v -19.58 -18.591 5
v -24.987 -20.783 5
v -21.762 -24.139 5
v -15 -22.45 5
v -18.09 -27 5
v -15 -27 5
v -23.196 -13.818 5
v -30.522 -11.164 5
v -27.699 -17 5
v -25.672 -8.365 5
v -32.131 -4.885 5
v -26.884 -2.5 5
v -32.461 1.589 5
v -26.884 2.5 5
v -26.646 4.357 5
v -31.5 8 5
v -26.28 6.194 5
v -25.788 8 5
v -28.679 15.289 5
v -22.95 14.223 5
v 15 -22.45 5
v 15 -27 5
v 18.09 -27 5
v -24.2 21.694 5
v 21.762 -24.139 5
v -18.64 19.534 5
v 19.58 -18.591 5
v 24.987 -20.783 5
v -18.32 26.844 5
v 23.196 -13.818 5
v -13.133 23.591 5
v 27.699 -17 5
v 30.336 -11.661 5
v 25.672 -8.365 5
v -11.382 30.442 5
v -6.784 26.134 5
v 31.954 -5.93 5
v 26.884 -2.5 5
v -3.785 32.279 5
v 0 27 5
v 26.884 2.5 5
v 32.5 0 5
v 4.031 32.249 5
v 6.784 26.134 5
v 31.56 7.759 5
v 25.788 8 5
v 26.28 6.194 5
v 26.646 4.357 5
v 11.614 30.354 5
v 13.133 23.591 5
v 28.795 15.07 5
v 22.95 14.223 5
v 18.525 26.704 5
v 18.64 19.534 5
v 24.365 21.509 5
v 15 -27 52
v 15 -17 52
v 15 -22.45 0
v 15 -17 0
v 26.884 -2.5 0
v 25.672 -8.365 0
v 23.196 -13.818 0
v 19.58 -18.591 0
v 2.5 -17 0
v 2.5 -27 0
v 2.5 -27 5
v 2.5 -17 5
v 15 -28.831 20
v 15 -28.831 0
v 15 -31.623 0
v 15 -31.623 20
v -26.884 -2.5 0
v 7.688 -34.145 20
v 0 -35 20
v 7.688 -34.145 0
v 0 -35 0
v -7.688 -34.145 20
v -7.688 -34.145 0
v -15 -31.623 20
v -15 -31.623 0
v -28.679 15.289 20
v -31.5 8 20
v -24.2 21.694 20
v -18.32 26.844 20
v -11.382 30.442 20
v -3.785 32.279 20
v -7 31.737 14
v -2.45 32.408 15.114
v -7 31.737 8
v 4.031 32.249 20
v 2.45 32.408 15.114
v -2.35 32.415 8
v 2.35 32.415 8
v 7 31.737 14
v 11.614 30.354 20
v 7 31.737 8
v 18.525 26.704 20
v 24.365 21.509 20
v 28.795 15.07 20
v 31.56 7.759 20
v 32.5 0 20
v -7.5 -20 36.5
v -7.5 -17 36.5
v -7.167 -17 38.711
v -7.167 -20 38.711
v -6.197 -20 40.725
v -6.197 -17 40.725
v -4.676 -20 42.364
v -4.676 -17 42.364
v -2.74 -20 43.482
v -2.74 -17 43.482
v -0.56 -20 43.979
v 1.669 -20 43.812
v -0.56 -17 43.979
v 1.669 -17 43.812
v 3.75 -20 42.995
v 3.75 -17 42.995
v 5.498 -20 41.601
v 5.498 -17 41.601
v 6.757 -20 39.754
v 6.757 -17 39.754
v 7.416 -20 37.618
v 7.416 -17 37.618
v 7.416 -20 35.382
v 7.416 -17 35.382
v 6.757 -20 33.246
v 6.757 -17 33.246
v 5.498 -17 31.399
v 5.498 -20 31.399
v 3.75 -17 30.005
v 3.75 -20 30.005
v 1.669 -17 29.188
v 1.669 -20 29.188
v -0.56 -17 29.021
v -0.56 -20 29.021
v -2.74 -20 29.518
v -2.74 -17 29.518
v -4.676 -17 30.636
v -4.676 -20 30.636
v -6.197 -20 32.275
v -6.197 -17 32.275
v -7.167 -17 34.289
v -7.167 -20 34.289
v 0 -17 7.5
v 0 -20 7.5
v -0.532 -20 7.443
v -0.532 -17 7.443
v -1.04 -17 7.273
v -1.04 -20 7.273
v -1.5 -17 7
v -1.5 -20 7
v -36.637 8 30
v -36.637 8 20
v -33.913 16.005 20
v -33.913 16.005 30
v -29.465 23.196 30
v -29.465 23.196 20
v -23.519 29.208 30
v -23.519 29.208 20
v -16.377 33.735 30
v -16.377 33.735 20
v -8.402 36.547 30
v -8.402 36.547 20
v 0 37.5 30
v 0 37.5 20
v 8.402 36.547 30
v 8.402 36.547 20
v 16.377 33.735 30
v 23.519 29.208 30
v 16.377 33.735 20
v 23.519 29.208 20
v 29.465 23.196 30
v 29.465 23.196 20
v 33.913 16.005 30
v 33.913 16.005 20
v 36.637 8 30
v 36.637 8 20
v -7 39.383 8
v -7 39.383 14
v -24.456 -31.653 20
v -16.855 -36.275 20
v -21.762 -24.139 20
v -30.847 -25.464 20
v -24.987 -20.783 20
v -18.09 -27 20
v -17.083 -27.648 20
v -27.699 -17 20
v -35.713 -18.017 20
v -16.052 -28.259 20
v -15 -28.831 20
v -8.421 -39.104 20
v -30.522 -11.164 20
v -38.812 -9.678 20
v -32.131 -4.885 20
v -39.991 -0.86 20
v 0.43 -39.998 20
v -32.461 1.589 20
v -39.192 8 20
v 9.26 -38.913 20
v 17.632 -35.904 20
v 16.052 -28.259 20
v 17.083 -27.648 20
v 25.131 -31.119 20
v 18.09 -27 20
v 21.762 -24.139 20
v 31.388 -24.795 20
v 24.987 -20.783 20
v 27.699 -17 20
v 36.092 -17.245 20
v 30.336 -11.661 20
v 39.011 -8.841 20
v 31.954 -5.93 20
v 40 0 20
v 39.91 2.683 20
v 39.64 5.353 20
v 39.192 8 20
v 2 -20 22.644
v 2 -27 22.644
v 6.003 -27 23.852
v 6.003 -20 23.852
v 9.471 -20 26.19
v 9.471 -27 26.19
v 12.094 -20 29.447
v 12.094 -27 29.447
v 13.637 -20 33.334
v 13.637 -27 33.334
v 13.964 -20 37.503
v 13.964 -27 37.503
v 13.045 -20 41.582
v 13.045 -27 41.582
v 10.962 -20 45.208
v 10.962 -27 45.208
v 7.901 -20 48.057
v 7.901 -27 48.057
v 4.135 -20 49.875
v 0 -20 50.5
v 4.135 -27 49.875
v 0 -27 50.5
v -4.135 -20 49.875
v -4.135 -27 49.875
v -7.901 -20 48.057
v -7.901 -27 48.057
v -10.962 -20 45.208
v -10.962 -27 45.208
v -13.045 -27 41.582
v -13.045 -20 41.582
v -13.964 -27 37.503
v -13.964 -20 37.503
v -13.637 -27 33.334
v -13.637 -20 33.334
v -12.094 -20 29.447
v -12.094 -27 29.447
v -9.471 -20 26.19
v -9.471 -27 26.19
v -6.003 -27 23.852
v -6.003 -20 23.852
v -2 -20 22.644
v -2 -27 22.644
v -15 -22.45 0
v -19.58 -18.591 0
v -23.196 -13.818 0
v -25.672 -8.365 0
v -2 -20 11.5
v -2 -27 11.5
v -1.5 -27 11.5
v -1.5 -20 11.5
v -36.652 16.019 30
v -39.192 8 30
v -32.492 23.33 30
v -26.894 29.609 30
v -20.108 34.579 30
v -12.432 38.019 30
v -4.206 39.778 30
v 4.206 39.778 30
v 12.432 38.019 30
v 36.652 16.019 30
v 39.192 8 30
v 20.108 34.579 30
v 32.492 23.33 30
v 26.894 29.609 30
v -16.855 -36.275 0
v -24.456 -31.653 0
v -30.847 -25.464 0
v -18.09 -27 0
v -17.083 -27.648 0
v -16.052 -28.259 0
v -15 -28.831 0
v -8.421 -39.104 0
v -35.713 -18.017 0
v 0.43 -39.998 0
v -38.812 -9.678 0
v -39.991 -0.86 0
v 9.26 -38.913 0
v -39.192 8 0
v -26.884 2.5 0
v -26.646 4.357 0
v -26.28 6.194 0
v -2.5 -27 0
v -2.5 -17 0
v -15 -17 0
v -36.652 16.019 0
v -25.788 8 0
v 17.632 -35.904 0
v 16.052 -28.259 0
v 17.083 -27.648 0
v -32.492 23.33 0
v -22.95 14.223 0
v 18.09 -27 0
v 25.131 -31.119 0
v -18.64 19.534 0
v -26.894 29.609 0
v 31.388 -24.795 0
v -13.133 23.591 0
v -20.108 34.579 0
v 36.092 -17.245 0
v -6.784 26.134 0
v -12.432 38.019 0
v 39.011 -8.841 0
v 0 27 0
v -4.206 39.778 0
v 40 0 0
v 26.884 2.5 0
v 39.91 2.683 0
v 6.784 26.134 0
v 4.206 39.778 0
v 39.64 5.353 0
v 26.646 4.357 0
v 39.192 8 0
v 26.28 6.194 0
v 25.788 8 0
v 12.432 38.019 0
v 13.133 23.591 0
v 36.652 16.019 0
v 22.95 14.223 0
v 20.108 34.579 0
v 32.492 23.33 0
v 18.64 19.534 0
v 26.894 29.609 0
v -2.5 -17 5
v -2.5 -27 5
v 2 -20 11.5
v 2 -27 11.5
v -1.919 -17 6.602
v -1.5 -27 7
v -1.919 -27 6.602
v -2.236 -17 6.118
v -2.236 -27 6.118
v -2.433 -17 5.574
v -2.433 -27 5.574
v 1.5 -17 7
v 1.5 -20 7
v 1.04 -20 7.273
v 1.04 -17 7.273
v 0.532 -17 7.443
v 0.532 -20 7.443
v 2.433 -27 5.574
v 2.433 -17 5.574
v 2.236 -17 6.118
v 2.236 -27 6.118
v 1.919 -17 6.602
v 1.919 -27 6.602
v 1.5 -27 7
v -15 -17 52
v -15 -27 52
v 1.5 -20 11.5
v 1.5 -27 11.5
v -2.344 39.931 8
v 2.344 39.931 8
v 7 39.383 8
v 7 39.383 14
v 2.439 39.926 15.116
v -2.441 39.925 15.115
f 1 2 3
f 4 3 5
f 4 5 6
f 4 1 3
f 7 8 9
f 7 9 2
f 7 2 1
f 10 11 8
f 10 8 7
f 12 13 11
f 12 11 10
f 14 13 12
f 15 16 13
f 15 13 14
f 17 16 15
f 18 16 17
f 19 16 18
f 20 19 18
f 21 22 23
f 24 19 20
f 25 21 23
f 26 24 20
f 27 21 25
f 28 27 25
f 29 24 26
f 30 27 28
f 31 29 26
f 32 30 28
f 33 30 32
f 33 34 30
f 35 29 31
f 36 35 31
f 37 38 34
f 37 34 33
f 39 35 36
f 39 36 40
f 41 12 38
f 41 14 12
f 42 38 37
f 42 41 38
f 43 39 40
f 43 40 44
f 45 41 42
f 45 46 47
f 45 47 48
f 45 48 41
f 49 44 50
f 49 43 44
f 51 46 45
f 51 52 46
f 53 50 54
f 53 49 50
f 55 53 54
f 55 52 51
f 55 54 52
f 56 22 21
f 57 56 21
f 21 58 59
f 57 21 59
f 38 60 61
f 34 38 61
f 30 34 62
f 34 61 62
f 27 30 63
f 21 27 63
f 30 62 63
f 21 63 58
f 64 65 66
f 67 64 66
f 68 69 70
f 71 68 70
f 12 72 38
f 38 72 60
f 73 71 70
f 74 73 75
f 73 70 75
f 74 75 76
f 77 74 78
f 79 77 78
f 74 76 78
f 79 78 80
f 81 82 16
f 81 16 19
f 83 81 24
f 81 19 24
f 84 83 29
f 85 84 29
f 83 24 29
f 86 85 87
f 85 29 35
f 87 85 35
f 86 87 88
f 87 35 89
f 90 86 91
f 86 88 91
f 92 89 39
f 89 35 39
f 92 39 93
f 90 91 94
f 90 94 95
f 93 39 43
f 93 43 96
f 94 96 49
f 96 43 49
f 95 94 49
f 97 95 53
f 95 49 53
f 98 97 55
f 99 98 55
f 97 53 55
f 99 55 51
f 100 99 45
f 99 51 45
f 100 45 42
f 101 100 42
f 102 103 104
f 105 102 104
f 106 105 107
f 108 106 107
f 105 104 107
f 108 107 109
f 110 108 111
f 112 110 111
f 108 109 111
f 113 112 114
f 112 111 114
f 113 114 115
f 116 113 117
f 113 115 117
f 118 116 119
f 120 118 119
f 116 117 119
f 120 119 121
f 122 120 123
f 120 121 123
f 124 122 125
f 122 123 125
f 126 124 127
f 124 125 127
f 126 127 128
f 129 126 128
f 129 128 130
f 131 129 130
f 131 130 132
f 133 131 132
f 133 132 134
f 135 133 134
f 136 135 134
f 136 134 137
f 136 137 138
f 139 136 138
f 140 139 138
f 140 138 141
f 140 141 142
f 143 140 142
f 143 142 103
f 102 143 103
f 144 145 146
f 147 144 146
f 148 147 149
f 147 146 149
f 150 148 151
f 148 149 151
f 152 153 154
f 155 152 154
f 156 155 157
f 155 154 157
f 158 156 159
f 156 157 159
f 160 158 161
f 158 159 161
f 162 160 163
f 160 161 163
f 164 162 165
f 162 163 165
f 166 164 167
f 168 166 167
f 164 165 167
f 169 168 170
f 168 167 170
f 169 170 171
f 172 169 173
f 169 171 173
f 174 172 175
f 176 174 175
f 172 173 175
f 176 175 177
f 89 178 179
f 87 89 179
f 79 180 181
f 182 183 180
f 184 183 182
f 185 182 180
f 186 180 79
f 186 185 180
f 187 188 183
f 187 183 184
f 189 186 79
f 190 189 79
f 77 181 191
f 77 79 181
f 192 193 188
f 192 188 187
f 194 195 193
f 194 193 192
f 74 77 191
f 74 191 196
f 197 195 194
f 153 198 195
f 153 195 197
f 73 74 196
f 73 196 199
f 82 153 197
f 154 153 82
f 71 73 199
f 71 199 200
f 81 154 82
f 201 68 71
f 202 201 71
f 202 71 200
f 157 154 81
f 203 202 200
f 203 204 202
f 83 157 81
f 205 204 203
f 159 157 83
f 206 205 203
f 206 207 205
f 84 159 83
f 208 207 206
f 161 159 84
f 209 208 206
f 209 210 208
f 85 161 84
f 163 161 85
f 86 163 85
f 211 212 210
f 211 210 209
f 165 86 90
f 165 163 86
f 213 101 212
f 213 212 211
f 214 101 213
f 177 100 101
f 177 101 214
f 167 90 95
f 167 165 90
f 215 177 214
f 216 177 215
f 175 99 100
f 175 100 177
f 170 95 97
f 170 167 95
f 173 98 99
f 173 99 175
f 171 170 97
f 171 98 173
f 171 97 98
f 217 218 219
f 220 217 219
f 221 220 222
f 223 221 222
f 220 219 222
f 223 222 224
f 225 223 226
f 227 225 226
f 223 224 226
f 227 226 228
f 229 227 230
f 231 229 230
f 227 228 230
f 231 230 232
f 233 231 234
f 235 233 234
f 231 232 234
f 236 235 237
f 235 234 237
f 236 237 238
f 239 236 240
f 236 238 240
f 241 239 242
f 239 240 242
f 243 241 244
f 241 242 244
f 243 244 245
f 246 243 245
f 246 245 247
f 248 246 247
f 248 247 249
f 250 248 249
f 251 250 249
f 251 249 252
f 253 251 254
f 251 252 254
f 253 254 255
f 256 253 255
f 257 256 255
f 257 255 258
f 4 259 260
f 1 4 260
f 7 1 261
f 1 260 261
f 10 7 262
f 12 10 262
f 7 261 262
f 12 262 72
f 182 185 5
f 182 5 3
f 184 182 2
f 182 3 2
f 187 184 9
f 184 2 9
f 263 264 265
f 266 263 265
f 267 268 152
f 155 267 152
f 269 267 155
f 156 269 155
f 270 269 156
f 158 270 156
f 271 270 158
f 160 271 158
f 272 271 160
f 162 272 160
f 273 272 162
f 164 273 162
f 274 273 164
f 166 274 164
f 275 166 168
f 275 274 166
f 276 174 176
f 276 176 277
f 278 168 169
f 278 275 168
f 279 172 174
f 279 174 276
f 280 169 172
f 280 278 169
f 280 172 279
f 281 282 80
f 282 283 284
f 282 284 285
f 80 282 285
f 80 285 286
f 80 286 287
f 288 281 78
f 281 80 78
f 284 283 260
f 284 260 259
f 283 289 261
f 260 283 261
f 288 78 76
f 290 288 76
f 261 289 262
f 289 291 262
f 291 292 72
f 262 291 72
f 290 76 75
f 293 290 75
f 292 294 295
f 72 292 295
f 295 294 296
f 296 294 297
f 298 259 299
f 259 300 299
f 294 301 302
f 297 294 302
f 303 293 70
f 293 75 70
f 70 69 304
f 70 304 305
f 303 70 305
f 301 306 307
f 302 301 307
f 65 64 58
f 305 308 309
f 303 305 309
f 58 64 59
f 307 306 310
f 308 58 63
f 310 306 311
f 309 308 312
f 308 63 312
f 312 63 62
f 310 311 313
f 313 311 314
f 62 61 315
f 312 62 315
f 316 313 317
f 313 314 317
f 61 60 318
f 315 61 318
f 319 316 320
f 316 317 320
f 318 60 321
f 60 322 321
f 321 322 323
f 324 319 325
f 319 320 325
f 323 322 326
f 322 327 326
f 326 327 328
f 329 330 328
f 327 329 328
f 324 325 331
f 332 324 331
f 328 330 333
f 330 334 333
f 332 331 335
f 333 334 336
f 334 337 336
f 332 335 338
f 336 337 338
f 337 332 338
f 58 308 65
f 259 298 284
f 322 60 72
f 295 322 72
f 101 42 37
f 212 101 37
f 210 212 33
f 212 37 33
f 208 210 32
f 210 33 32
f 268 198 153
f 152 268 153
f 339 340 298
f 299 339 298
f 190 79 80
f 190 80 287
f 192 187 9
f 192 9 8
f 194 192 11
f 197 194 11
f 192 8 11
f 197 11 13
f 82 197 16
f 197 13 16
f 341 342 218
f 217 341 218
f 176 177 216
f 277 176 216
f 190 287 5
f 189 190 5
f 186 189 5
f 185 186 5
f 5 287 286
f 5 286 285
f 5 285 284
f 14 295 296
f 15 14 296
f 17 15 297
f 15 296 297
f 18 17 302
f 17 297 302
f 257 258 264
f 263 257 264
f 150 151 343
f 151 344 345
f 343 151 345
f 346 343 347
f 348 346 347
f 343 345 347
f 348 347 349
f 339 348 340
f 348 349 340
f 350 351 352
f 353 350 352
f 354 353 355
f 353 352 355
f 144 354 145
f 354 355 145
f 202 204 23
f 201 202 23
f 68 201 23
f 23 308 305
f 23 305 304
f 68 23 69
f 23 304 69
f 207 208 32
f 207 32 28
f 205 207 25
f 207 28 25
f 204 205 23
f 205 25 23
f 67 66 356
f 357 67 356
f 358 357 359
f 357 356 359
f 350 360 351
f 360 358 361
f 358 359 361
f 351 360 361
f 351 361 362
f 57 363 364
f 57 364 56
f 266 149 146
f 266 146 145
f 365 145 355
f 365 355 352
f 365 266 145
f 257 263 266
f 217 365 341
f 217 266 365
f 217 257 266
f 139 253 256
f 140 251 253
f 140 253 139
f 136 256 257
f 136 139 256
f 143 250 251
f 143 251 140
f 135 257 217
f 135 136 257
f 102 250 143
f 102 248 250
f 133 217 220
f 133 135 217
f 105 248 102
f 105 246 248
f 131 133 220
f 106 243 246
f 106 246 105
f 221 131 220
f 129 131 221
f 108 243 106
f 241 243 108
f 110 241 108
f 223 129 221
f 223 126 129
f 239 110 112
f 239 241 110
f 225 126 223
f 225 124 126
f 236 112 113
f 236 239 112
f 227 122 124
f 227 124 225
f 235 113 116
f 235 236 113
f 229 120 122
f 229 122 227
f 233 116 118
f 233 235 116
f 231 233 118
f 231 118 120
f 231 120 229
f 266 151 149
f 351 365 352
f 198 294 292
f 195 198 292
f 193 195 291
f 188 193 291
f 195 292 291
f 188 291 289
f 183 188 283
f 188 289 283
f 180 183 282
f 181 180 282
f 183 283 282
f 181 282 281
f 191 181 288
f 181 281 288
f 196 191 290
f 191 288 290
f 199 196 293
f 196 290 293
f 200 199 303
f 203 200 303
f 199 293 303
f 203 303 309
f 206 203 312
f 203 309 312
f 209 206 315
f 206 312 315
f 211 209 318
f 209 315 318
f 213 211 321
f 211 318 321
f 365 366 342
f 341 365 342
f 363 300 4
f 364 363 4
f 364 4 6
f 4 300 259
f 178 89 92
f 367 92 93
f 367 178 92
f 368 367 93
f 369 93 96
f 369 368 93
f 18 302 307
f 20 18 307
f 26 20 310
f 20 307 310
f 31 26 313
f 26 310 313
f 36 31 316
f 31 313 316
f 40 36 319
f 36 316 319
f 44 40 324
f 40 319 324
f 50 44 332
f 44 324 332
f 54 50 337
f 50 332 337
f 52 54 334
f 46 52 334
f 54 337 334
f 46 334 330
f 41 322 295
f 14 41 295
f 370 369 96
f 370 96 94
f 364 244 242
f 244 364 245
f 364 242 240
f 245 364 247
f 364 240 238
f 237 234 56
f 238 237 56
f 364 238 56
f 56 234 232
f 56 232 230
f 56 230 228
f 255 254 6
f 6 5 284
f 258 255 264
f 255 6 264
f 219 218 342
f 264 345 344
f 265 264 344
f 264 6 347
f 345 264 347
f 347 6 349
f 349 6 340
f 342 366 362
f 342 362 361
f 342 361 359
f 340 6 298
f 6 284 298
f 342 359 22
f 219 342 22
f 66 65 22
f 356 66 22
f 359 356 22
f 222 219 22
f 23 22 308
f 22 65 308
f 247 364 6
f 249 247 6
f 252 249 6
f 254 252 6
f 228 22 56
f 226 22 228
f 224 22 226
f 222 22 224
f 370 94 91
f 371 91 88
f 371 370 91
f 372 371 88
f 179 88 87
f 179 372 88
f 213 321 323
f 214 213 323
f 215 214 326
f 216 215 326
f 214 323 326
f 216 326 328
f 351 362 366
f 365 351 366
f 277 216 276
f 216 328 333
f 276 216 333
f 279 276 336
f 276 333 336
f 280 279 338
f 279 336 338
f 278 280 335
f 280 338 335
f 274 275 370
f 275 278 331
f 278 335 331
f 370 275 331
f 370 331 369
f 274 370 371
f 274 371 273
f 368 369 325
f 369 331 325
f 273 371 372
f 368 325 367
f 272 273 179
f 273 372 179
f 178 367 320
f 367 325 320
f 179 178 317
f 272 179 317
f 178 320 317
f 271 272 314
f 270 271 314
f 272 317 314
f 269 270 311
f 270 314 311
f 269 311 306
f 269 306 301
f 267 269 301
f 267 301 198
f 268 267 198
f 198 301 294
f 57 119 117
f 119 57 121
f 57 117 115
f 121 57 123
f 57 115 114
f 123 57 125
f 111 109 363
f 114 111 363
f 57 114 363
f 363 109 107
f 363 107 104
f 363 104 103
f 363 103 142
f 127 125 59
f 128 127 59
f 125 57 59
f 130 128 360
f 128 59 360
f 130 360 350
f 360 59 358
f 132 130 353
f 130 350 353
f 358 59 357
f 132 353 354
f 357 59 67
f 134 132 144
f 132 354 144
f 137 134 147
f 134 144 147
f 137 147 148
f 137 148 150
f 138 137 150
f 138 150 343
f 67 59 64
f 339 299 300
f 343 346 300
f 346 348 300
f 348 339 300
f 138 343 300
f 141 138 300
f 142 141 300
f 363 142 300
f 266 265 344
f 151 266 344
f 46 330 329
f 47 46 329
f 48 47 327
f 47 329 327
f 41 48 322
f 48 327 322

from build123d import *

# Parameters (mm, degrees)
F3_DEPTH  = 20
F4_DEPTH  = 30
F5_DEPTH  = 5
F6_DEPTH  = 52
F8_DEPTH  = 10
F9_DEPTH  = 7
F11_W     = 14
F11_H     = 6
F12_DEPTH = 20
F13_R     = 7.5
F14_DEPTH = 25


with BuildPart() as f3:
    # F2 (on Top) → F3 (new body)
    with BuildSketch(Plane.XY):
        with BuildLine():
            ThreePointArc((37.5, 0), (-4.0232211828, -37.2835579219), (-36.6367302034, 8))
            Line((-36.6367302034, 8), (-39.1918358845, 8))
            ThreePointArc((-39.1918358845, 8), (-4.0203584802, -39.7974461202), (40, 0))
            ThreePointArc((40, 0), (39.7974461202, 4.0203584802), (39.1918358845, 8))
            Line((39.1918358845, 8), (36.6367302034, 8))
            ThreePointArc((36.6367302034, 8), (37.2835579219, 4.0232211828), (37.5, 0))
        make_face()
        with BuildLine():
            Line((-39.1918358845, 8), (-36.6367302034, 8))
            ThreePointArc((-36.6367302034, 8), (0, 37.5), (36.6367302034, 8))
            Line((36.6367302034, 8), (39.1918358845, 8))
            ThreePointArc((39.1918358845, 8), (0, 40), (-39.1918358845, 8))
        make_face()
        with BuildLine():
            Line((-36.6367302034, 8), (-34.0734500748, 8))
            ThreePointArc((-34.0734500748, 8), (0, 35), (34.0734500748, 8))
            Line((34.0734500748, 8), (36.6367302034, 8))
            ThreePointArc((36.6367302034, 8), (0, 37.5), (-36.6367302034, 8))
        make_face()
        with BuildLine():
            ThreePointArc((-22.2710574513, -27), (-26.9013321157, -22.3901391332), (-30.5941170816, -17))
            ThreePointArc((-30.5941170816, -17), (-34.6658846776, -4.824566252), (-34.0734500748, 8))
            Line((-34.0734500748, 8), (-36.6367302034, 8))
            ThreePointArc((-36.6367302034, 8), (-4.0232211828, -37.2835579219), (37.5, 0))
            ThreePointArc((37.5, 0), (37.2835579219, 4.0232211828), (36.6367302034, 8))
            Line((36.6367302034, 8), (34.0734500748, 8))
            ThreePointArc((34.0734500748, 8), (34.7675908902, 4.0267385923), (35, 0))
            ThreePointArc((35, 0), (33.8806294057, -8.7808286097), (30.5941170816, -17))
            ThreePointArc((30.5941170816, -17), (26.9013321157, -22.3901391332), (22.2710574513, -27))
            ThreePointArc((22.2710574513, -27), (18.7783238539, -29.5359874262), (15, -31.6227766017))
            ThreePointArc((15, -31.6227766017), (0, -35), (-15, -31.6227766017))
            ThreePointArc((-15, -31.6227766017), (-18.7783238539, -29.5359874262), (-22.2710574513, -27))
        make_face()
        with BuildLine():
            ThreePointArc((-34.0734500748, 8), (-34.6658846776, -4.824566252), (-30.5941170816, -17))
            Line((-30.5941170816, -17), (-27.6992779689, -17))
            ThreePointArc((-27.6992779689, -17), (-32.1308049699, -4.884810333), (-31.5, 8))
            Line((-31.5, 8), (-34.0734500748, 8))
        make_face()
        with BuildLine():
            ThreePointArc((34.0734500748, 8), (0, 35), (-34.0734500748, 8))
            Line((-34.0734500748, 8), (-31.5, 8))
            ThreePointArc((-31.5, 8), (0, 32.5), (31.5, 8))
            Line((31.5, 8), (34.0734500748, 8))
        make_face()
        with BuildLine():
            ThreePointArc((35, 0), (34.7675908902, 4.0267385923), (34.0734500748, 8))
            Line((34.0734500748, 8), (31.5, 8))
            ThreePointArc((31.5, 8), (32.2490309932, 4.0311288741), (32.5, 0))
            ThreePointArc((32.5, 0), (31.2768007794, -8.8324250919), (27.6992779689, -17))
            Line((27.6992779689, -17), (30.5941170816, -17))
            ThreePointArc((30.5941170816, -17), (33.8806294057, -8.7808286097), (35, 0))
        make_face()
        with BuildLine():
            Line((-27.6992779689, -17), (-30.5941170816, -17))
            ThreePointArc((-30.5941170816, -17), (-26.9013321157, -22.3901391332), (-22.2710574513, -27))
            Line((-22.2710574513, -27), (-18.0900525151, -27))
            ThreePointArc((-18.0900525151, -27), (-23.4342846391, -22.5185324445), (-27.6992779689, -17))
        make_face()
        with BuildLine():
            Line((18.0900525151, -27), (22.2710574513, -27))
            ThreePointArc((22.2710574513, -27), (26.9013321157, -22.3901391332), (30.5941170816, -17))
            Line((30.5941170816, -17), (27.6992779689, -17))
            ThreePointArc((27.6992779689, -17), (23.4342846391, -22.5185324445), (18.0900525151, -27))
        make_face()
        with BuildLine():
            Line((-18.0900525151, -27), (-22.2710574513, -27))
            ThreePointArc((-22.2710574513, -27), (-18.7783238539, -29.5359874262), (-15, -31.6227766017))
            Line((-15, -31.6227766017), (-15, -28.8314064867))
            ThreePointArc((-15, -28.8314064867), (-16.5703471989, -27.9584261665), (-18.0900525151, -27))
        make_face()
        with BuildLine():
            Line((15, -28.8314064867), (15, -31.6227766017))
            ThreePointArc((15, -31.6227766017), (18.7783238539, -29.5359874262), (22.2710574513, -27))
            Line((22.2710574513, -27), (18.0900525151, -27))
            ThreePointArc((18.0900525151, -27), (16.5703471989, -27.9584261665), (15, -28.8314064867))
        make_face()
    extrude(amount=F3_DEPTH)

    # F2 (on Top) → F4 (join)
    with BuildSketch(Plane.XY):
        with BuildLine():
            Line((-39.1918358845, 8), (-36.6367302034, 8))
            ThreePointArc((-36.6367302034, 8), (0, 37.5), (36.6367302034, 8))
            Line((36.6367302034, 8), (39.1918358845, 8))
            ThreePointArc((39.1918358845, 8), (0, 40), (-39.1918358845, 8))
        make_face()
    extrude(amount=F4_DEPTH)

    # F2 (on Top) → F5 (join)
    with BuildSketch(Plane.XY):
        with BuildLine():
            ThreePointArc((-31.5, 8), (-32.1308049699, -4.884810333), (-27.6992779689, -17))
            ThreePointArc((-27.6992779689, -17), (-23.4342846391, -22.5185324445), (-18.0900525151, -27))
            Line((-18.0900525151, -27), (-15, -27))
            Line((-15, -27), (-15, -22.4499443206))
            ThreePointArc((-15, -22.4499443206), (-23.1962851655, -13.8178274168), (-26.8840101175, -2.5))
            Line((-26.8840101175, -2.5), (-30, -2.5))
            Line((-30, -2.5), (-30, 2.5))
            Line((-30, 2.5), (-26.8840101175, 2.5))
            ThreePointArc((-26.8840101175, 2.5), (-26.4789910661, 5.2785445079), (-25.7875939165, 8))
            Line((-25.7875939165, 8), (-31.5, 8))
        make_face()
        with BuildLine():
            Line((-27.6992779689, -17), (-30.5941170816, -17))
            ThreePointArc((-30.5941170816, -17), (-26.9013321157, -22.3901391332), (-22.2710574513, -27))
            Line((-22.2710574513, -27), (-18.0900525151, -27))
            ThreePointArc((-18.0900525151, -27), (-23.4342846391, -22.5185324445), (-27.6992779689, -17))
        make_face()
        with BuildLine():
            Line((18.0900525151, -27), (22.2710574513, -27))
            ThreePointArc((22.2710574513, -27), (26.9013321157, -22.3901391332), (30.5941170816, -17))
            Line((30.5941170816, -17), (27.6992779689, -17))
            ThreePointArc((27.6992779689, -17), (23.4342846391, -22.5185324445), (18.0900525151, -27))
        make_face()
        with BuildLine():
            ThreePointArc((32.5, 0), (32.2490309932, 4.0311288741), (31.5, 8))
            Line((31.5, 8), (25.7875939165, 8))
            ThreePointArc((25.7875939165, 8), (26.4789910661, 5.2785445079), (26.8840101175, 2.5))
            Line((26.8840101175, 2.5), (30, 2.5))
            Line((30, 2.5), (30, -2.5))
            Line((30, -2.5), (26.8840101175, -2.5))
            ThreePointArc((26.8840101175, -2.5), (23.1962851655, -13.8178274168), (15, -22.4499443206))
            Line((15, -22.4499443206), (15, -27))
            Line((15, -27), (18.0900525151, -27))
            ThreePointArc((18.0900525151, -27), (23.4342846391, -22.5185324445), (27.6992779689, -17))
            ThreePointArc((27.6992779689, -17), (31.2768007794, -8.8324250919), (32.5, 0))
        make_face()
        with BuildLine():
            ThreePointArc((35, 0), (34.7675908902, 4.0267385923), (34.0734500748, 8))
            Line((34.0734500748, 8), (31.5, 8))
            ThreePointArc((31.5, 8), (32.2490309932, 4.0311288741), (32.5, 0))
            ThreePointArc((32.5, 0), (31.2768007794, -8.8324250919), (27.6992779689, -17))
            Line((27.6992779689, -17), (30.5941170816, -17))
            ThreePointArc((30.5941170816, -17), (33.8806294057, -8.7808286097), (35, 0))
        make_face()
        with BuildLine():
            ThreePointArc((31.5, 8), (0, 32.5), (-31.5, 8))
            Line((-31.5, 8), (-25.7875939165, 8))
            ThreePointArc((-25.7875939165, 8), (0, 27), (25.7875939165, 8))
            Line((25.7875939165, 8), (31.5, 8))
        make_face()
        with BuildLine():
            ThreePointArc((34.0734500748, 8), (0, 35), (-34.0734500748, 8))
            Line((-34.0734500748, 8), (-31.5, 8))
            ThreePointArc((-31.5, 8), (0, 32.5), (31.5, 8))
            Line((31.5, 8), (34.0734500748, 8))
        make_face()
        with BuildLine():
            ThreePointArc((-26.8840101175, -2.5), (-27, 0), (-26.8840101175, 2.5))
            Line((-26.8840101175, 2.5), (-30, 2.5))
            Line((-30, 2.5), (-30, -2.5))
            Line((-30, -2.5), (-26.8840101175, -2.5))
        make_face()
        with BuildLine():
            Line((30, 2.5), (26.8840101175, 2.5))
            ThreePointArc((26.8840101175, 2.5), (26.9709869413, 1.2513446421), (27, 0))
            ThreePointArc((27, 0), (26.9709869413, -1.2513446421), (26.8840101175, -2.5))
            Line((26.8840101175, -2.5), (30, -2.5))
            Line((30, -2.5), (30, 2.5))
        make_face()
        with BuildLine():
            Line((26.8840101175, 2.5), (-26.8840101175, 2.5))
            ThreePointArc((-26.8840101175, 2.5), (-27, 0), (-26.8840101175, -2.5))
            Line((-26.8840101175, -2.5), (26.8840101175, -2.5))
            ThreePointArc((26.8840101175, -2.5), (26.9709869413, -1.2513446421), (27, 0))
            ThreePointArc((27, 0), (26.9709869413, 1.2513446421), (26.8840101175, 2.5))
        make_face()
    extrude(amount=F5_DEPTH)

    # F2 (on Top) → F6 (join)
    with BuildSketch(Plane.XY):
        with BuildLine():
            ThreePointArc((-15, -22.4499443206), (-7.8374582405, -25.8374582405), (0, -27))
            ThreePointArc((0, -27), (7.8374582405, -25.8374582405), (15, -22.4499443206))
            Line((15, -22.4499443206), (15, -17))
            Line((15, -17), (-15, -17))
            Line((-15, -17), (-15, -22.4499443206))
        make_face()
        with BuildLine():
            Line((-15, -22.4499443206), (-15, -27))
            Line((-15, -27), (0, -27))
            ThreePointArc((0, -27), (-7.8374582405, -25.8374582405), (-15, -22.4499443206))
        make_face()
        with BuildLine():
            ThreePointArc((15, -22.4499443206), (7.8374582405, -25.8374582405), (0, -27))
            Line((0, -27), (15, -27))
            Line((15, -27), (15, -22.4499443206))
        make_face()
    extrude(amount=F6_DEPTH)

    # F7 (on face) → F8 (cut)
    with BuildSketch(Plane.XZ.offset(27)):
        with BuildLine():
            Line((-2.5, 5), (2.5, 5))
            ThreePointArc((2.5, 5), (2.2360679775, 6.1180339887), (1.5, 7))
            ThreePointArc((1.5, 7), (0.790569415, 7.3717082451), (0, 7.5))
            ThreePointArc((0, 7.5), (-0.790569415, 7.3717082451), (-1.5, 7))
            ThreePointArc((-1.5, 7), (-2.2360679775, 6.1180339887), (-2.5, 5))
        make_face()
        with BuildLine():
            ThreePointArc((-2.5, 5), (0, 2.5), (2.5, 5))
            Line((2.5, 5), (-2.5, 5))
        make_face()
        with BuildLine():
            Line((-2.5, 0), (2.5, 0))
            Line((2.5, 0), (2.5, 5))
            ThreePointArc((2.5, 5), (0, 2.5), (-2.5, 5))
            Line((-2.5, 5), (-2.5, 0))
        make_face()
    extrude(amount=-F8_DEPTH, mode=Mode.SUBTRACT)

    # F7 (on face) → F9 (cut)
    with BuildSketch(Plane.XZ.offset(27)):
        Polygon((-1.5, 7.5), (0, 7.5), (1.5, 7.5), (1.5, 11.5), (-1.5, 11.5), align=None)
        Polygon((-1.5, 11.5), (1.5, 11.5), (2, 11.5), (2, 22.5), (0, 22.5), (-2, 22.5), (-2, 11.5), align=None)
        with BuildLine():
            Line((-1.5, 7.5), (-1.5, 7))
            ThreePointArc((-1.5, 7), (-0.790569415, 7.3717082451), (0, 7.5))
            Line((0, 7.5), (-1.5, 7.5))
        make_face()
        with BuildLine():
            ThreePointArc((0, 7.5), (0.790569415, 7.3717082451), (1.5, 7))
            Line((1.5, 7), (1.5, 7.5))
            Line((1.5, 7.5), (0, 7.5))
        make_face()
        with BuildLine():
            ThreePointArc((-2, 22.6435935394), (-1.0025740751, 22.535944528), (0, 22.5))
            ThreePointArc((0, 22.5), (1.0025740751, 22.535944528), (2, 22.6435935394))
            ThreePointArc((2, 22.6435935394), (10.5830052443, 27.3348486101), (14, 36.5))
            ThreePointArc((14, 36.5), (-9.1651513899, 47.0830052443), (-2, 22.6435935394))
        make_face()
        with BuildLine():
            Line((-2, 22.6435935394), (-2, 22.5))
            Line((-2, 22.5), (0, 22.5))
            ThreePointArc((0, 22.5), (-1.0025740751, 22.535944528), (-2, 22.6435935394))
        make_face()
        with BuildLine():
            Line((0, 22.5), (2, 22.5))
            Line((2, 22.5), (2, 22.6435935394))
            ThreePointArc((2, 22.6435935394), (1.0025740751, 22.535944528), (0, 22.5))
        make_face()
    extrude(amount=-F9_DEPTH, mode=Mode.SUBTRACT)

    # F11 (on offset) → F12 (cut)
    with BuildSketch(Plane.XZ.offset(-40)):
        with Locations((0, 11)):
            Rectangle(F11_W, F11_H)
        with BuildLine():
            ThreePointArc((7, 14), (0, 15.2650060048), (-7, 14))
            Line((-7, 14), (7, 14))
        make_face()
    extrude(amount=F12_DEPTH, mode=Mode.SUBTRACT)

    # F13 (on face) → F14 (cut)
    with BuildSketch(Plane(origin=(0, -17, 0), x_dir=(-1, 0, 0), z_dir=(0, 1, 0))):
        with Locations((0, 36.5)):
            Circle(F13_R)
    extrude(amount=-F14_DEPTH, mode=Mode.SUBTRACT)


solid = f3.part
